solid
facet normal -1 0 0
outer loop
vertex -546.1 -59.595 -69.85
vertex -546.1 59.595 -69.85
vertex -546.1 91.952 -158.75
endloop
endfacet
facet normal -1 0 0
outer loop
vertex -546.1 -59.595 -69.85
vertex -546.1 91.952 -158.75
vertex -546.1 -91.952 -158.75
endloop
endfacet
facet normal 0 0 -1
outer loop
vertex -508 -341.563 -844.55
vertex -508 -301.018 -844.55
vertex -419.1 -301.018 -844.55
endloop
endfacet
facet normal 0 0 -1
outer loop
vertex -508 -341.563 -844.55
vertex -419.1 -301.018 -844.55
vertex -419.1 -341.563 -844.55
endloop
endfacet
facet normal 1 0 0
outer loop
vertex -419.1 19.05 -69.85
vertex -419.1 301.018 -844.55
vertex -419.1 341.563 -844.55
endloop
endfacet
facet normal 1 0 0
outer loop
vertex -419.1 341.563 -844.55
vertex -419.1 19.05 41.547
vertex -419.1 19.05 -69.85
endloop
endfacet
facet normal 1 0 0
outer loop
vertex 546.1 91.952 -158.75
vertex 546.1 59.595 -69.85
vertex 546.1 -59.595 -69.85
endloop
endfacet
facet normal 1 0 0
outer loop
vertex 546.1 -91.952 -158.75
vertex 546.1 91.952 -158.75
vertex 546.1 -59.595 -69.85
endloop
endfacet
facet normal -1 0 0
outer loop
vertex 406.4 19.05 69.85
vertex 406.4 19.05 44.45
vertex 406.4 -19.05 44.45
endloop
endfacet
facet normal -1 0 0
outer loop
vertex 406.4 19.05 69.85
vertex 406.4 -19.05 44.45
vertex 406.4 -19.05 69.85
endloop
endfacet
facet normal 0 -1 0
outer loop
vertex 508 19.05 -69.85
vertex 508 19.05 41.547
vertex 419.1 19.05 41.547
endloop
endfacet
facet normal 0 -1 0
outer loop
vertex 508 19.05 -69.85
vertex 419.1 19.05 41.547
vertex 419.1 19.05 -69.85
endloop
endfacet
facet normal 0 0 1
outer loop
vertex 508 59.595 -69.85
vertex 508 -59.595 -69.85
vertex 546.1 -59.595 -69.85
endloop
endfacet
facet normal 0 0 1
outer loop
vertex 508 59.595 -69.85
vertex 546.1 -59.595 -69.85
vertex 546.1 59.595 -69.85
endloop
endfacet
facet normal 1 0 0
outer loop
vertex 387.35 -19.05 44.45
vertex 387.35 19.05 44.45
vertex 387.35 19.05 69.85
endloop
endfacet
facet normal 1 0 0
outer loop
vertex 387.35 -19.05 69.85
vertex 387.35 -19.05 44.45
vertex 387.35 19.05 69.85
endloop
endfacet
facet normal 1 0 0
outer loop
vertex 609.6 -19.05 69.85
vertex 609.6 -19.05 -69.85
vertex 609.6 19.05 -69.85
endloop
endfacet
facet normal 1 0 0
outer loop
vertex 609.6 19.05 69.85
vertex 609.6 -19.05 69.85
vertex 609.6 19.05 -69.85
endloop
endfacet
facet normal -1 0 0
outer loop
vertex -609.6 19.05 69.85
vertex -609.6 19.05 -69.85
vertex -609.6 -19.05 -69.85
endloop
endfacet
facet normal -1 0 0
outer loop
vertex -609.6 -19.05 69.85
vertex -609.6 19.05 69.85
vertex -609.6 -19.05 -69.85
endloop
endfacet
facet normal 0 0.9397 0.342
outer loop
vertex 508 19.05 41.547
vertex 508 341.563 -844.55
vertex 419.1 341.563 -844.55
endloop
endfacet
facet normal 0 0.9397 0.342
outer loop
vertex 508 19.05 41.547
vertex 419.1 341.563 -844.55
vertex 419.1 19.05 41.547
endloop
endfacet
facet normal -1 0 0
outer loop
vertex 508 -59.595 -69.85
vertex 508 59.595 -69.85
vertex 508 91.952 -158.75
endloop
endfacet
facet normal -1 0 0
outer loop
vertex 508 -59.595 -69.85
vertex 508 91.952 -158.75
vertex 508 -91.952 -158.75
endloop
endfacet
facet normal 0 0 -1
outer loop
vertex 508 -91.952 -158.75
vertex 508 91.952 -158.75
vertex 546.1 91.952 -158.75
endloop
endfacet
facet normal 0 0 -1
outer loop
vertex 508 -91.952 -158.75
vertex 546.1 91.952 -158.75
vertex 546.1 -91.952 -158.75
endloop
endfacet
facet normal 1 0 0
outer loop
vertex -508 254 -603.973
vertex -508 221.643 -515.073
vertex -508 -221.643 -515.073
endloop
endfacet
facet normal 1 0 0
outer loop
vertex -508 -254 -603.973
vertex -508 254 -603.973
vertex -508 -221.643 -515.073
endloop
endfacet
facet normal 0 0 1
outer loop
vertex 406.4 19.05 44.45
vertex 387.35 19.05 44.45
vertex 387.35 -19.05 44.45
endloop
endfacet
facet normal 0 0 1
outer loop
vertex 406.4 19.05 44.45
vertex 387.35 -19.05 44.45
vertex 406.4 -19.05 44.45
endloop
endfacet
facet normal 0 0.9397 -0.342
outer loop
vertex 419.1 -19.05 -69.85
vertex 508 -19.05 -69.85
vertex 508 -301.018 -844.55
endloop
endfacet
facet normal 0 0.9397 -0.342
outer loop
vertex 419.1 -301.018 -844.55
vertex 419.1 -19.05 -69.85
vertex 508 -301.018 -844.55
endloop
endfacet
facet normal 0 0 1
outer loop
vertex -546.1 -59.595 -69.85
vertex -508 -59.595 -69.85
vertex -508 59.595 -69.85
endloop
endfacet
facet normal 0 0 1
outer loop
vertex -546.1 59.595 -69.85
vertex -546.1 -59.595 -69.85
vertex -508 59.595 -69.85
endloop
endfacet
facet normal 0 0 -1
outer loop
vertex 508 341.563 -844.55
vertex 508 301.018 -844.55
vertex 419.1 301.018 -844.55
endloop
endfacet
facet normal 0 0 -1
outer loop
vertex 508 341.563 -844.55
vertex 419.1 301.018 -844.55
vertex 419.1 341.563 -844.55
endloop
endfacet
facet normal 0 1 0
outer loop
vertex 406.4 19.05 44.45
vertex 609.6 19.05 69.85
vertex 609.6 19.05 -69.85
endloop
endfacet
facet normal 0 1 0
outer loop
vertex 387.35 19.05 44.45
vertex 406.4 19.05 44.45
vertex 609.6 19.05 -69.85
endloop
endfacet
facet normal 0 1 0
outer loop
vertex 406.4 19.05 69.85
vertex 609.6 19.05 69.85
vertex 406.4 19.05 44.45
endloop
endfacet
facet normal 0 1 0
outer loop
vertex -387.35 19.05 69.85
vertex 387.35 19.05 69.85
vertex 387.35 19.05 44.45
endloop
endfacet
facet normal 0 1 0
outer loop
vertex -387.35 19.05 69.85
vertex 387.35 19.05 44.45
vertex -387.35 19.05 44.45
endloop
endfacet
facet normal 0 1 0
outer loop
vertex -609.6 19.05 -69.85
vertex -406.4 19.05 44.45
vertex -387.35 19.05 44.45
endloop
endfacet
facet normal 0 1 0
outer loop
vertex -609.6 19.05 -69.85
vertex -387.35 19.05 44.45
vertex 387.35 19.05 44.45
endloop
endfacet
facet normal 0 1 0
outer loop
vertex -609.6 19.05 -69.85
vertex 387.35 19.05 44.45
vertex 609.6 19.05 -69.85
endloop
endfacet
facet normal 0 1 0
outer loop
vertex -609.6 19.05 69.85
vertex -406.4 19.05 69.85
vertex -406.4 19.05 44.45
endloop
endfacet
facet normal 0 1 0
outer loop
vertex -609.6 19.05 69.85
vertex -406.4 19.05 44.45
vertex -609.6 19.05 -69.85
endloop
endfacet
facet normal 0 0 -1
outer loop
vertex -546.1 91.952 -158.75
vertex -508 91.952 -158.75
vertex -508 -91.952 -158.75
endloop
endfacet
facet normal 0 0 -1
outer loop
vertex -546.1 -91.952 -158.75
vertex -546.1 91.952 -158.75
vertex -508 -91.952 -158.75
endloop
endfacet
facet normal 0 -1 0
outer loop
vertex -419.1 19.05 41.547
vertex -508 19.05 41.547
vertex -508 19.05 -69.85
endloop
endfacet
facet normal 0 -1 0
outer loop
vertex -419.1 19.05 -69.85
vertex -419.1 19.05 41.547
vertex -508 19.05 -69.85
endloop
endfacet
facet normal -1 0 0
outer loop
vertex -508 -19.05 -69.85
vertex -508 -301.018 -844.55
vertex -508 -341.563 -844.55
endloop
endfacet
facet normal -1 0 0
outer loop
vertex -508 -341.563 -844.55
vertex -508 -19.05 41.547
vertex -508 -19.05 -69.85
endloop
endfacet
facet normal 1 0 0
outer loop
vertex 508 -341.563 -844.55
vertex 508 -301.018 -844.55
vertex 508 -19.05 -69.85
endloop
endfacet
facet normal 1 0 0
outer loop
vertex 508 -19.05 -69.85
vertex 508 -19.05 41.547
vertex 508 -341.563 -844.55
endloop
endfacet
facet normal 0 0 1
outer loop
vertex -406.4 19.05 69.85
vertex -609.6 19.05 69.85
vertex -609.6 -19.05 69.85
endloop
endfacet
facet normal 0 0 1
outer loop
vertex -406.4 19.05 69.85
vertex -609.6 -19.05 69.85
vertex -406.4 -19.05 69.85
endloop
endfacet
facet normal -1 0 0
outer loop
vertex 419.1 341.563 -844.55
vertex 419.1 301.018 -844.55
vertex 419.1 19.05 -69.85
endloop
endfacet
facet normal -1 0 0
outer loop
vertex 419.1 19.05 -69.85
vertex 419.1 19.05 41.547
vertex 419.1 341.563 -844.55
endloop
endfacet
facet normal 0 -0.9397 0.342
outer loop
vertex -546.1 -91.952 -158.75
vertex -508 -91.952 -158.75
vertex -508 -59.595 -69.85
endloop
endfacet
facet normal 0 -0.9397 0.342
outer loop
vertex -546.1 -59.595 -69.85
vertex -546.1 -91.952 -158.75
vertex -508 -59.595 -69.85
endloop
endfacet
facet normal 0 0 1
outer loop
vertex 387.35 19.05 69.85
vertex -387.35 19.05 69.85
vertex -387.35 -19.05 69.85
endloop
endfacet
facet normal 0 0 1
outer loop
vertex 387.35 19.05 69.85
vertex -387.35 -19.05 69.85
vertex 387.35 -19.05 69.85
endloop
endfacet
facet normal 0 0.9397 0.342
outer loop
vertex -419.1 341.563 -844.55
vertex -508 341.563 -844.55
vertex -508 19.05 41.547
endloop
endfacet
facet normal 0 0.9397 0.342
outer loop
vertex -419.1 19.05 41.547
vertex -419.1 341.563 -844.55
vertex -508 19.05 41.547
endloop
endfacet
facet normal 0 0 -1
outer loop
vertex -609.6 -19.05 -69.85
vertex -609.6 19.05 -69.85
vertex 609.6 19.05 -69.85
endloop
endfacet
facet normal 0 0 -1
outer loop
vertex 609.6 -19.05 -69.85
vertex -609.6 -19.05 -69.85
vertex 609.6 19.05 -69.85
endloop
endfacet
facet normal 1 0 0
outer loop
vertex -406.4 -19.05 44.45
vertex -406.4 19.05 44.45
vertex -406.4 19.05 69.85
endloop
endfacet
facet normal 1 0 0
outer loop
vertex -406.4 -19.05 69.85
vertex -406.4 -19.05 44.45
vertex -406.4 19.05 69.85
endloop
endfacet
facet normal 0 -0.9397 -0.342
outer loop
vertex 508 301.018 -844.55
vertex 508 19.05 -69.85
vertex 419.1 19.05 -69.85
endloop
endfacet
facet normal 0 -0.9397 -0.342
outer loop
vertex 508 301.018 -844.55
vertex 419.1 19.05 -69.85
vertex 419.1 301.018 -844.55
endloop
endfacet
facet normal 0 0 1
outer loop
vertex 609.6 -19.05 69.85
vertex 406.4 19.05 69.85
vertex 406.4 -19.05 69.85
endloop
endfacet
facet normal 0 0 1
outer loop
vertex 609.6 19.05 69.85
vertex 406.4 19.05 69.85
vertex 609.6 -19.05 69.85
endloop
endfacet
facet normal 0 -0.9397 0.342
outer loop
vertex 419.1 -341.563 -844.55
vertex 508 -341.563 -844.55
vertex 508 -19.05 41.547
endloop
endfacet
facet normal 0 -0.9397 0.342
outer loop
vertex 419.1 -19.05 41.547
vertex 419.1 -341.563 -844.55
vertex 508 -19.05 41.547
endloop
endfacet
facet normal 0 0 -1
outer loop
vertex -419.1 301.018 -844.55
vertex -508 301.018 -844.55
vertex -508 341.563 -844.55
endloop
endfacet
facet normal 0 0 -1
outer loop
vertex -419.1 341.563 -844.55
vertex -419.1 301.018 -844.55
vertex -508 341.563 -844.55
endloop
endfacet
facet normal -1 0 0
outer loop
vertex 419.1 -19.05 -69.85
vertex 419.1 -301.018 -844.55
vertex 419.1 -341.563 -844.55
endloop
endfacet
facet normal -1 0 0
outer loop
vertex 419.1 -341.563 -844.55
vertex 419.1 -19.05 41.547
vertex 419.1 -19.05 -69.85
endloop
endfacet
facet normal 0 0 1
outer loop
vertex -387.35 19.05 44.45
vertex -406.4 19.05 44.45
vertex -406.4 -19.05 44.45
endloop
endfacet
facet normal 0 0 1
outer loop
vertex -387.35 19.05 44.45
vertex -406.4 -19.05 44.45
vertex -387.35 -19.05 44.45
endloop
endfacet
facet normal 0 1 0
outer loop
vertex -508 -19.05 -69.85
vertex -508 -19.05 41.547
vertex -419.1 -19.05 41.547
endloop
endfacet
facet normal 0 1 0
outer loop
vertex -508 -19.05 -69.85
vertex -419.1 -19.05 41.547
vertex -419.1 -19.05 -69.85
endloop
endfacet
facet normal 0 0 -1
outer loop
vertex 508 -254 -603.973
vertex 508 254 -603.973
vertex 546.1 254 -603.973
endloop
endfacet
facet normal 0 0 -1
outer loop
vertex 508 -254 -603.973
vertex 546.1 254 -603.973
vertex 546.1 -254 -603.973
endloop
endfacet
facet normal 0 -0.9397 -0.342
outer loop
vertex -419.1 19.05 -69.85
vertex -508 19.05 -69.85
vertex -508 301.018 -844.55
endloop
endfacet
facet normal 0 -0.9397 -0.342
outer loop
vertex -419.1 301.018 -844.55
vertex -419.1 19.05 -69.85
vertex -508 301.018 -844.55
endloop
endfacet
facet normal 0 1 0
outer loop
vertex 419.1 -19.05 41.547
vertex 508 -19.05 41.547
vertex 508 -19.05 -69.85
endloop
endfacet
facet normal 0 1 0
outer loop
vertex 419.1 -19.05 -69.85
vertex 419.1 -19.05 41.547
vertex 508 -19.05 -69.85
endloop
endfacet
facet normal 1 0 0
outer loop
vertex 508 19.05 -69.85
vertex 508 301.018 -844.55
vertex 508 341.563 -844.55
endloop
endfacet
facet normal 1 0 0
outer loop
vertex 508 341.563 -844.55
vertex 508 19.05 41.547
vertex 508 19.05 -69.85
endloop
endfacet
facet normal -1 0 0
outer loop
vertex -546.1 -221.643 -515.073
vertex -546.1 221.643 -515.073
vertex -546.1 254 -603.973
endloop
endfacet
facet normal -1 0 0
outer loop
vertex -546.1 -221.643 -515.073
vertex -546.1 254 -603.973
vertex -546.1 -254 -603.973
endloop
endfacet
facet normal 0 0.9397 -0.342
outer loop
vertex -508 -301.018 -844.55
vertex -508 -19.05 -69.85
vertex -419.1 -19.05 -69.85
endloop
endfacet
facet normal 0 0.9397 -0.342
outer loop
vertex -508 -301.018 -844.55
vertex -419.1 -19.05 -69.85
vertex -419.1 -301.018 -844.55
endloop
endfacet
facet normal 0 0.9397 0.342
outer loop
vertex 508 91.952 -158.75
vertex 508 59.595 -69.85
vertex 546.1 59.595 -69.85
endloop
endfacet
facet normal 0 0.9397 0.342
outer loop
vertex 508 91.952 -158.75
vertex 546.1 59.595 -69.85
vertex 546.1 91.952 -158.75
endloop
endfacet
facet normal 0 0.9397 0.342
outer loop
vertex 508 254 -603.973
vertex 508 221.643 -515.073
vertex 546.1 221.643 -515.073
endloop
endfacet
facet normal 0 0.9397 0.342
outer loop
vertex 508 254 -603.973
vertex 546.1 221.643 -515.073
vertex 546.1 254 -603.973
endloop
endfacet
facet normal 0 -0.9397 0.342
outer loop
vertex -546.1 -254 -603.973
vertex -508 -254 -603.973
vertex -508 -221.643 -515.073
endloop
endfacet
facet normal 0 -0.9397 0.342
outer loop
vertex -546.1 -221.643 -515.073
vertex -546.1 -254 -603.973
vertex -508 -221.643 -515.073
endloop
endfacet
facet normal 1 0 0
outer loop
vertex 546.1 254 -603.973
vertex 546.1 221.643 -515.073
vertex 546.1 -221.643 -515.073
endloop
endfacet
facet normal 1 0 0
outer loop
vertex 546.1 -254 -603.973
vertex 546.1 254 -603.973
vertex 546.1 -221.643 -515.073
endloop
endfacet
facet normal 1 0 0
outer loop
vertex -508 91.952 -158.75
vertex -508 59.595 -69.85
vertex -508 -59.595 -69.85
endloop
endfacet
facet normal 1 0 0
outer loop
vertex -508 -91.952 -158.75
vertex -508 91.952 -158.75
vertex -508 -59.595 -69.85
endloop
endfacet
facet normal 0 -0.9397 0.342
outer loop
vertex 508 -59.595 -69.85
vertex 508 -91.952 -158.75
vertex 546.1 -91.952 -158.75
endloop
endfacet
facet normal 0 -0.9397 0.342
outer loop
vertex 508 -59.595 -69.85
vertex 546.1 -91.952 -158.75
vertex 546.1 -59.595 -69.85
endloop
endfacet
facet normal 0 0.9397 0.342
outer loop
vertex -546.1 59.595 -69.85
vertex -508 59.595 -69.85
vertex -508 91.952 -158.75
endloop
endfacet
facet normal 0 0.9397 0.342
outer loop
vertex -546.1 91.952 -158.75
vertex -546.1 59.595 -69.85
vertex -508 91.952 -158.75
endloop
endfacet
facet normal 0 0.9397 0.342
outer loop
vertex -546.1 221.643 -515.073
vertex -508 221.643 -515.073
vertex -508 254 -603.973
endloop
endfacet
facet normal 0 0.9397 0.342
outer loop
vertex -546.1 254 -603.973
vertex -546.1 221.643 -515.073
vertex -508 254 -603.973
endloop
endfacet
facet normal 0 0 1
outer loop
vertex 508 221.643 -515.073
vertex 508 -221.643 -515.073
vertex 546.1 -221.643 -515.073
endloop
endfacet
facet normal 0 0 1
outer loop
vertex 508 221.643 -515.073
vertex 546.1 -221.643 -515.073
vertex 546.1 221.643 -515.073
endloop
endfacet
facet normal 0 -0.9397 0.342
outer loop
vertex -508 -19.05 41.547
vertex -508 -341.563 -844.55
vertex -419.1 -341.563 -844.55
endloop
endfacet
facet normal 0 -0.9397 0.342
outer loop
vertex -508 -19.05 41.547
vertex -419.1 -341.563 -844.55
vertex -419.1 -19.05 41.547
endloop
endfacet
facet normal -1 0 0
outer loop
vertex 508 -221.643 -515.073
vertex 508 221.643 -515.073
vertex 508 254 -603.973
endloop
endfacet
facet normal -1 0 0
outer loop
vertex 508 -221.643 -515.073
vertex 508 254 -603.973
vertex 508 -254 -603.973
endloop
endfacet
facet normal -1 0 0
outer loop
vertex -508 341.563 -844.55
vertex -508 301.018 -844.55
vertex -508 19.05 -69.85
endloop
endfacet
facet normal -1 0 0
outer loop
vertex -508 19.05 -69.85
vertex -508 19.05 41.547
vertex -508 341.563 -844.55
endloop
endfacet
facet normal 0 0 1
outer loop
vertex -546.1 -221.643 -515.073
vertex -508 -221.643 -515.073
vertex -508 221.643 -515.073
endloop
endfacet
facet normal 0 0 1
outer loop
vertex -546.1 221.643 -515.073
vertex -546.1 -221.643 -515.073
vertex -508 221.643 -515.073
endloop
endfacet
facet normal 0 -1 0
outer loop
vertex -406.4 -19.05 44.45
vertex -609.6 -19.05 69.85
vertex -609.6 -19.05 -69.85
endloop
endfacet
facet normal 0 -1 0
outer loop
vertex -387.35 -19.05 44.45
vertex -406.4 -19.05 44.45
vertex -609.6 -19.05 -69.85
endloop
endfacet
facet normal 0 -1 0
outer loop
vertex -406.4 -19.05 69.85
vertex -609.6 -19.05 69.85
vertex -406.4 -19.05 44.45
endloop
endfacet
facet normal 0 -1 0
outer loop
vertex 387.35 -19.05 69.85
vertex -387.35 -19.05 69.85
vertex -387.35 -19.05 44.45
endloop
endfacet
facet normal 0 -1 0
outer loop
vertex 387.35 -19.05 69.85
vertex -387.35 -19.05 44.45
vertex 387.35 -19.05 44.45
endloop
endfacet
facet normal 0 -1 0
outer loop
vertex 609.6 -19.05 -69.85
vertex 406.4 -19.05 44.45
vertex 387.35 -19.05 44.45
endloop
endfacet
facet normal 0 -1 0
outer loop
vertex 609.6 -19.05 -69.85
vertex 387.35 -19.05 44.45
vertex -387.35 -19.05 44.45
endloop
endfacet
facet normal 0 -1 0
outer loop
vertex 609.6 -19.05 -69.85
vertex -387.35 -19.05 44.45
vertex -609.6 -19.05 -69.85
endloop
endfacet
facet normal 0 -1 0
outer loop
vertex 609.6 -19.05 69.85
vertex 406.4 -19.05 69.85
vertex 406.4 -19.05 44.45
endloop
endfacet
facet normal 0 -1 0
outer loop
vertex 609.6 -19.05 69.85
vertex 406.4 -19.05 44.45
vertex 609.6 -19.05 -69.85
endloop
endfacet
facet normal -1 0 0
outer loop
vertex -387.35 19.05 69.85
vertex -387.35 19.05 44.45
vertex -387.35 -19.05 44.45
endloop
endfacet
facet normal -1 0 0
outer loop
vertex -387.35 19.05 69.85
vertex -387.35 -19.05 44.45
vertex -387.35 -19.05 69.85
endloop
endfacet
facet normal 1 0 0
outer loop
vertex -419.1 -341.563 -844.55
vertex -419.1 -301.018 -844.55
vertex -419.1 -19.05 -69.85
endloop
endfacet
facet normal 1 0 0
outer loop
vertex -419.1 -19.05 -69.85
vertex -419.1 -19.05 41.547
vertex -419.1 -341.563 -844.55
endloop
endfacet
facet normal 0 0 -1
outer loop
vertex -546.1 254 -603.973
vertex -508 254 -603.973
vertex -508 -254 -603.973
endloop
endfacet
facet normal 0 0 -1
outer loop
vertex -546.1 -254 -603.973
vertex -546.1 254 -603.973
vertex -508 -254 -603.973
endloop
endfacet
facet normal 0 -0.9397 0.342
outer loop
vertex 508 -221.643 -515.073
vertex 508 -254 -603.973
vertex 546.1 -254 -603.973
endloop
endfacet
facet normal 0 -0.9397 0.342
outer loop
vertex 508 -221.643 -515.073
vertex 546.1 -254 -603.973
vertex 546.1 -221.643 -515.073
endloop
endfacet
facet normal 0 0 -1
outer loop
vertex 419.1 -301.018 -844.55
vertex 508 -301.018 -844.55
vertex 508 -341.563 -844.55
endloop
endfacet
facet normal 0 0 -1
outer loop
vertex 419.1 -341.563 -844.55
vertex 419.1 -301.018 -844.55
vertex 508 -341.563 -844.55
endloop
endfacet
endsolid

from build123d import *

# Parameters (mm, degrees)
F1_DEPTH  = 69.85
F4_W      = 19.05
F4_H      = 25.4
F5_DEPTH  = 50.8
F6_DEPTH  = 88.9
F9_DEPTH  = 38.1
F10_DEPTH = 38.1


with BuildPart() as f1:
    # F0 (on Top) → F1 (new body, symmetric)
    with BuildSketch(Plane.XY):
        Polygon((-609.6, 19.05), (-609.6, 0), (-609.6, -19.05), (609.6, -19.05), (609.6, 0), (609.6, 19.05), align=None)
    extrude(amount=F1_DEPTH, both=True)

    # F4 (on face) → F5 (cut)
    with BuildSketch(Plane.XZ.offset(19.05)):
        with Locations((-396.875, 57.15)):
            Rectangle(F4_W, F4_H)
        with Locations((396.875, 57.15)):
            Rectangle(F4_W, F4_H)
    extrude(amount=-F5_DEPTH, mode=Mode.SUBTRACT)


with BuildPart() as f6:
    # F3 (on offset) → F6 (new body)
    with BuildSketch(Plane(origin=(-508, 0, 0), x_dir=(0, -1, 0), z_dir=(-1, 0, 0))):
        Polygon((341.562914, -844.55), (19.05, 41.546948), (19.05, -69.85), (301.01774, -844.55), align=None)
    extrude(amount=-F6_DEPTH)


with BuildPart() as f7_1:
    # F7: instance of F6
    add(f6.part.mirror(Plane.XZ))


with BuildPart() as f9:
    # F8 (on face) → F9 (new body)
    with BuildSketch(Plane(origin=(-508, 0, 0), x_dir=(0, -1, 0), z_dir=(-1, 0, 0))):
        Polygon((-19.05, -69.85), (-59.595173, -69.85), (-91.952127, -158.75), (51.406954, -158.75), (19.05, -69.85), align=None)
        Polygon((19.05, -69.85), (51.406954, -158.75), (91.952127, -158.75), (59.595173, -69.85), align=None)
    extrude(amount=F9_DEPTH)


with BuildPart() as f10:
    # F8 (on face) → F10 (new body)
    with BuildSketch(Plane(origin=(-508, 0, 0), x_dir=(0, -1, 0), z_dir=(-1, 0, 0))):
        Polygon((221.643046, -515.072872), (181.097873, -515.072872), (213.454827, -603.972872), (254, -603.972872), align=None)
        Polygon((181.097873, -515.072872), (-221.643046, -515.072872), (-254, -603.972872), (213.454827, -603.972872), align=None)
    extrude(amount=F10_DEPTH)


with BuildPart() as f11_1:
    # F11: instance of F7_1
    add(f7_1.part.mirror(Plane.YZ))


with BuildPart() as f11_2:
    # F11: instance of F9
    add(f9.part.mirror(Plane.YZ))


with BuildPart() as f11_3:
    # F11: instance of F6
    add(f6.part.mirror(Plane.YZ))


with BuildPart() as f11_4:
    # F11: instance of F10
    add(f10.part.mirror(Plane.YZ))


solid = Compound([f1.part, f6.part, f7_1.part, f9.part, f10.part, f11_1.part, f11_2.part, f11_3.part, f11_4.part])
